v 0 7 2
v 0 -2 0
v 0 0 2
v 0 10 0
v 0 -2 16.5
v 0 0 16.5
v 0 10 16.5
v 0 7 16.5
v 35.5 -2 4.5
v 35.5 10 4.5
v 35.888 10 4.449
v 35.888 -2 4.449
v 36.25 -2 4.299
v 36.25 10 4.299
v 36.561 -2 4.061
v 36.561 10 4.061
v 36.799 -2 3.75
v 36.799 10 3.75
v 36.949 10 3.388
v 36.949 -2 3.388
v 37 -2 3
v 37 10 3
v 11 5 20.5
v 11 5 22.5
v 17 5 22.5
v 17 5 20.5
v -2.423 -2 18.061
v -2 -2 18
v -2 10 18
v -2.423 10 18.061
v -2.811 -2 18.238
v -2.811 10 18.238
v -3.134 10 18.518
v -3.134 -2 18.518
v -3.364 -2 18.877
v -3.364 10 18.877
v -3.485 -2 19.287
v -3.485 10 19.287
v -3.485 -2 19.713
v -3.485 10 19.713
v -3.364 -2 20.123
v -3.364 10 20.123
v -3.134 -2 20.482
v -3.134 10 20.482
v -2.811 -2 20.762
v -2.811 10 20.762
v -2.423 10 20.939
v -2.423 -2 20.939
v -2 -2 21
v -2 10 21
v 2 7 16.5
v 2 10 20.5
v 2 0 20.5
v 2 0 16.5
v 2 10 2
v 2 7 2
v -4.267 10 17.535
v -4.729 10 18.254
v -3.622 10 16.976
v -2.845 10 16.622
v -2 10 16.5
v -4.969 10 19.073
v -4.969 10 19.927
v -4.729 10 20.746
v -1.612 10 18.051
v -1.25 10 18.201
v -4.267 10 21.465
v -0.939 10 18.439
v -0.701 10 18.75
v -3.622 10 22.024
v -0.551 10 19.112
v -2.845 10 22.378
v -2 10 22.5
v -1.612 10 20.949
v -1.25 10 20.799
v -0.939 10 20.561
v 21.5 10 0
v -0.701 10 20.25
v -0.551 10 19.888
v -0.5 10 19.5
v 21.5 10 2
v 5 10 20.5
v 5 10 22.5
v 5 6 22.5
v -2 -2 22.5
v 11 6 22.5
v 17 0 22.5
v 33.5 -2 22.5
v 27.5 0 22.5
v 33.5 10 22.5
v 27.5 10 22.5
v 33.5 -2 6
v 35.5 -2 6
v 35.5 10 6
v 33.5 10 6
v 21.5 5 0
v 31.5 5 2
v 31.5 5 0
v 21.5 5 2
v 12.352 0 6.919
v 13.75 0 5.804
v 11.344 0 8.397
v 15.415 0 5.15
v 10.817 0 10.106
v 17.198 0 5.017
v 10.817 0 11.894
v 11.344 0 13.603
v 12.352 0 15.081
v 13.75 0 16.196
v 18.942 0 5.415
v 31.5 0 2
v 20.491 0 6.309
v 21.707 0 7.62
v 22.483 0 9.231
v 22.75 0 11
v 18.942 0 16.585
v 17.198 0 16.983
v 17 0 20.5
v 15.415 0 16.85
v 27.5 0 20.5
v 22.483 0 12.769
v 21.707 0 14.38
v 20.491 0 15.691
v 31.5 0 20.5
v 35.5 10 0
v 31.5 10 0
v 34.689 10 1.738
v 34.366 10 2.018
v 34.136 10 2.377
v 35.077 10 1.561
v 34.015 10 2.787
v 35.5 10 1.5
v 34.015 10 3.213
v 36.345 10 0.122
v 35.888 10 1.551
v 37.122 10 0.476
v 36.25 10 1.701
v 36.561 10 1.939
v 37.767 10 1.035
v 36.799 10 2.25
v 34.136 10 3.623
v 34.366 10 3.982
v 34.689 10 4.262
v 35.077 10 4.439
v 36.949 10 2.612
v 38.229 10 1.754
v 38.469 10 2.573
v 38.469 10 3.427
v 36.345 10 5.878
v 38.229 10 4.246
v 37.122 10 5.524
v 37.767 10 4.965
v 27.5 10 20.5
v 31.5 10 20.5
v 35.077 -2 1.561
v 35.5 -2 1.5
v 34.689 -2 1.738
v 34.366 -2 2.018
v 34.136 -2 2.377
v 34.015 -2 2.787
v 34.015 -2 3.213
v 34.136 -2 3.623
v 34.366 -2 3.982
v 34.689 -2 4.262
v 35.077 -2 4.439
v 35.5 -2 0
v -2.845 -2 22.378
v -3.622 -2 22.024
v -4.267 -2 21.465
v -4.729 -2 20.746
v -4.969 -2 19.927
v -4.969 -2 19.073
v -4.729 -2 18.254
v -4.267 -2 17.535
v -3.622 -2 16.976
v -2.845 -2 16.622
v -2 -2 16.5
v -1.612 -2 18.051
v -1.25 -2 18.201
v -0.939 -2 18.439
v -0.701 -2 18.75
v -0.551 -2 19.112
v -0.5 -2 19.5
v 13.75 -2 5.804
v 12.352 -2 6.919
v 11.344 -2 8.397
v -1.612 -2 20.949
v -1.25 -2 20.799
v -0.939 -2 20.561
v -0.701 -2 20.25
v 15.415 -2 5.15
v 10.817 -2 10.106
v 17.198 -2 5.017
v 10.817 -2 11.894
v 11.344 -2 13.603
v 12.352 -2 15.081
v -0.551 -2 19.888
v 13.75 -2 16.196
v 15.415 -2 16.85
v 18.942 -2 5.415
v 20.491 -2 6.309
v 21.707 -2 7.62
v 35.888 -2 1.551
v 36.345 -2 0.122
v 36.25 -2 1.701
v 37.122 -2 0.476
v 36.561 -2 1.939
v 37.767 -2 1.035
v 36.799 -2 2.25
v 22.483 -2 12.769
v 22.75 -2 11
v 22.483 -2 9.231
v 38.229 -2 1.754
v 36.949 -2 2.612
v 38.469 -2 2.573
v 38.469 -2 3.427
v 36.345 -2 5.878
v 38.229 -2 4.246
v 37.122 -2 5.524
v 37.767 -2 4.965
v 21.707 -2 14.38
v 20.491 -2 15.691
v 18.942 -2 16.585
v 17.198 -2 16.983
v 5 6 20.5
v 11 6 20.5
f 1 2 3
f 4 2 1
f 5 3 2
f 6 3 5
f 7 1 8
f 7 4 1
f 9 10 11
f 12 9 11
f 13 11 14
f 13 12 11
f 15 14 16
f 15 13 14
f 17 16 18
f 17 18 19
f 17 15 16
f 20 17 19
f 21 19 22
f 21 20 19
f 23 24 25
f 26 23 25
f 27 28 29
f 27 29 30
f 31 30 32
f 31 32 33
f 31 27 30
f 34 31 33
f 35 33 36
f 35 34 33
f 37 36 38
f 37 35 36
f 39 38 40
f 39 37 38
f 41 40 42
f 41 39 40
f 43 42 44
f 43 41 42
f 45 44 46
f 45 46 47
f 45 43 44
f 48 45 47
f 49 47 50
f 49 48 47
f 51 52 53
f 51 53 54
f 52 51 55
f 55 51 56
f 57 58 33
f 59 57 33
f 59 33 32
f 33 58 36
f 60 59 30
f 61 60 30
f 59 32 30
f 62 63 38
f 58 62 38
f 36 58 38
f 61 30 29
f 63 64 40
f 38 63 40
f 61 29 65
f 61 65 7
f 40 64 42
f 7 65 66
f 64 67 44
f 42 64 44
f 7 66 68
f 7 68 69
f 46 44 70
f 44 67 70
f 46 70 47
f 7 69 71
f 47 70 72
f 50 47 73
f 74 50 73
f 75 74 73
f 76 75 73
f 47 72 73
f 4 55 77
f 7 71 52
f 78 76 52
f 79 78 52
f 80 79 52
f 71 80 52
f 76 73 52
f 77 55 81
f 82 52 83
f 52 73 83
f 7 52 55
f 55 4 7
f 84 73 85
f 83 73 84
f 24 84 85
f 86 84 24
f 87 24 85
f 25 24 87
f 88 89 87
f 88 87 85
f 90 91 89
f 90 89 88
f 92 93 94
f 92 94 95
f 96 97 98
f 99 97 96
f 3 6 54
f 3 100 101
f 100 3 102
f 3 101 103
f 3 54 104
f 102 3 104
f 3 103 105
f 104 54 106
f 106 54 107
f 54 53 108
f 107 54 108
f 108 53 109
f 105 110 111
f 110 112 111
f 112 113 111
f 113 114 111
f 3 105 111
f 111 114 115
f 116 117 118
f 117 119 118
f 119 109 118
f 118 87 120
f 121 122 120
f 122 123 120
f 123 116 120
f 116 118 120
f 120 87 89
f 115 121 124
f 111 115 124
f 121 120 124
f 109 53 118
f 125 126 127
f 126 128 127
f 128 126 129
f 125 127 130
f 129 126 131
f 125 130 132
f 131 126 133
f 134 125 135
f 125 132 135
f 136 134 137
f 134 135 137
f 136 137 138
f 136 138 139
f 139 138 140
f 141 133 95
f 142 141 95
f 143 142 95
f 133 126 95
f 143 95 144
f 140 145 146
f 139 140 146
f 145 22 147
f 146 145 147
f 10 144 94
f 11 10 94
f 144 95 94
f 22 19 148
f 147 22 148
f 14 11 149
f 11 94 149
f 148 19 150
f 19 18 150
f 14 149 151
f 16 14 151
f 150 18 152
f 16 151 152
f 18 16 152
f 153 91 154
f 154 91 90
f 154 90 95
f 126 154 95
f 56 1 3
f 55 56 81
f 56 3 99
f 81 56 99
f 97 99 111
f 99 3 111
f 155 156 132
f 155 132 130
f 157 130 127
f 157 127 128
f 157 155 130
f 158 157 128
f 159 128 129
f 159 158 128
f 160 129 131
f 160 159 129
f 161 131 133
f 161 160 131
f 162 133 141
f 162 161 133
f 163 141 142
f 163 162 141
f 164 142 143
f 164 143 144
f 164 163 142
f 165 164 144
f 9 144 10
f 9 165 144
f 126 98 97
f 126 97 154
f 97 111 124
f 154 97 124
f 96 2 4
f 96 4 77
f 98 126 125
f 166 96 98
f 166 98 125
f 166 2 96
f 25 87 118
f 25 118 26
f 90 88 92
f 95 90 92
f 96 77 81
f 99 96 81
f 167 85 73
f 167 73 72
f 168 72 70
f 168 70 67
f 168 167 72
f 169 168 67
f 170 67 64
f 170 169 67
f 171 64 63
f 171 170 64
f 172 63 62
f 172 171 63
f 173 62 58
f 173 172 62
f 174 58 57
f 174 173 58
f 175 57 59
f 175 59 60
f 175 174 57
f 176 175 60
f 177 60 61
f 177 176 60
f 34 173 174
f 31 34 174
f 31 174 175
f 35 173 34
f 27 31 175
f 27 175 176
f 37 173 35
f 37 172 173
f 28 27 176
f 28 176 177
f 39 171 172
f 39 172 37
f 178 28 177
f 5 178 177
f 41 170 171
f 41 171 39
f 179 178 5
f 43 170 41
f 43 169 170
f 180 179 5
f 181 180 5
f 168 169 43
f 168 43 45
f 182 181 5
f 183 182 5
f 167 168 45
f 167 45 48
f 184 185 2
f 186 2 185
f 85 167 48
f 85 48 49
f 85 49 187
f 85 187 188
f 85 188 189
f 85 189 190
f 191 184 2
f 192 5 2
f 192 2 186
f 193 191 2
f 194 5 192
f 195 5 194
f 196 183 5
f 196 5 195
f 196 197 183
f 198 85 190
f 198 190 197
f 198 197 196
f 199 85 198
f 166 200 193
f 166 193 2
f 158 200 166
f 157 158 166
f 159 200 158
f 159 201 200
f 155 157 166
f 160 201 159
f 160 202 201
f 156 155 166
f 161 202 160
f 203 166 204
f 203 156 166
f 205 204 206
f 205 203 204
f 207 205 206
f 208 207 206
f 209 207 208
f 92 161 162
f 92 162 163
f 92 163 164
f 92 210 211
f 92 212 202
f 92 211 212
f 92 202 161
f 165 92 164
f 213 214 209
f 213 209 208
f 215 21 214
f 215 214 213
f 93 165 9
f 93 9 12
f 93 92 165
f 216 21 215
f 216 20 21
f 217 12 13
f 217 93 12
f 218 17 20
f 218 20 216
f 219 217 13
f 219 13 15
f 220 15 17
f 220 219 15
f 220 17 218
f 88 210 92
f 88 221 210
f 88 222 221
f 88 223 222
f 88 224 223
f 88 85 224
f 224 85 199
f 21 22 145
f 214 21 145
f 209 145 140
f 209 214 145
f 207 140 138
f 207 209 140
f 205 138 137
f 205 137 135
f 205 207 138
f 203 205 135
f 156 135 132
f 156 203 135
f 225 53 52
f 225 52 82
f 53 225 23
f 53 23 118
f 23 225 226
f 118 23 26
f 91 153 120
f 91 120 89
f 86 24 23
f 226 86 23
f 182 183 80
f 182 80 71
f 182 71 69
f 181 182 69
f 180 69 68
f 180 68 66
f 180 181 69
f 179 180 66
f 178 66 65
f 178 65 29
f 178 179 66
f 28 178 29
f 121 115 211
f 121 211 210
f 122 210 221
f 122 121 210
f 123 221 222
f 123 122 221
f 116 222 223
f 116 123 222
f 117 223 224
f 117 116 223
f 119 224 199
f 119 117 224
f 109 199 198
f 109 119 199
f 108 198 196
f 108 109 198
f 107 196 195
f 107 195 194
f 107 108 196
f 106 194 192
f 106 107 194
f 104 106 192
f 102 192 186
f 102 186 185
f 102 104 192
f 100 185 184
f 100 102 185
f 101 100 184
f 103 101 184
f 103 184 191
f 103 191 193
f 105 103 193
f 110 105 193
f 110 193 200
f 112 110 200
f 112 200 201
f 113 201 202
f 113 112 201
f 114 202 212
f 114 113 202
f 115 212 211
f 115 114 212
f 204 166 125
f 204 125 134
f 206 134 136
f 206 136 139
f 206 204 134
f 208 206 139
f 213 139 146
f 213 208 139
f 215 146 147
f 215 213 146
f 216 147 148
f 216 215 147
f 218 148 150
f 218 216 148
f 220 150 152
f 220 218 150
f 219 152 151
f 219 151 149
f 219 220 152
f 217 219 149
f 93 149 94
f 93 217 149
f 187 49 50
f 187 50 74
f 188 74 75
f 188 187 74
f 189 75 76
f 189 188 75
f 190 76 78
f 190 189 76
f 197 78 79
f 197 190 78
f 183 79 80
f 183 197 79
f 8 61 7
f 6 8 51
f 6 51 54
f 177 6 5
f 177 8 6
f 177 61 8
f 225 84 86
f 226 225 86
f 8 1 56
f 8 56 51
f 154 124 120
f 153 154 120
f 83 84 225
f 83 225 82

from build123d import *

# Parameters (mm, degrees)
F0_W      = 33.5
F0_H      = 22.5
F0_R      = 6
F1_DEPTH  = 2
F3_DEPTH  = 10
F4_W      = 6
F4_H      = 4
F5_DEPTH  = 2
F7_DEPTH  = 12
F8_W      = 6
F8_H      = 5
F9_DEPTH  = 2
F10_W     = 10
F10_H     = 2
F11_DEPTH = 5
F12_W     = 7
F12_H     = 14.5
F13_DEPTH = 2


with BuildPart() as f1:
    # F0 (on Front) → F1 (new body)
    with BuildSketch(Plane.XZ):
        with Locations((16.75, 11.25)):
            Rectangle(F0_W, F0_H)
        with Locations((16.75, 11)):
            Circle(F0_R, mode=Mode.SUBTRACT)
    extrude(amount=F1_DEPTH)

    # F2 (on face) → F3 (join)
    with BuildSketch(Plane(origin=(0, 0, 0), x_dir=(-1, 0, 0), z_dir=(0, 1, 0))):
        Polygon((-27.5, 22.5), (-33.5, 22.5), (-33.5, 0), (0, 0), (0, 22.5), (-11, 22.5), (-11, 20.5), (-2, 20.5), (-2, 2), (-31.5, 2), (-31.5, 20.5), (-27.5, 20.5), align=None)
    extrude(amount=F3_DEPTH)

    # F4 (on face) → F5 (cut, through all)
    with BuildSketch(Plane.XY.offset(22.5)):
        with Locations((8, 8)):
            Rectangle(F4_W, F4_H)
    extrude(amount=-F5_DEPTH, mode=Mode.SUBTRACT)

    # F6 (on face) → F7 (join, through all)
    with BuildSketch(Plane.XZ.offset(2)):
        with BuildLine():
            Line((33.5, 6), (33.5, 0))
            Line((33.5, 0), (35.5, 0))
            Line((35.5, 0), (35.5, 1.5))
            ThreePointArc((35.5, 1.5), (34, 3), (35.5, 4.5))
            Line((35.5, 4.5), (35.5, 6))
            Line((35.5, 6), (33.5, 6))
        make_face()
        with BuildLine():
            Line((35.5, 1.5), (35.5, 0))
            ThreePointArc((35.5, 0), (38.5, 3), (35.5, 6))
            Line((35.5, 6), (35.5, 4.5))
            ThreePointArc((35.5, 4.5), (36.56066, 4.06066), (37, 3))
            ThreePointArc((37, 3), (36.56066, 1.93934), (35.5, 1.5))
        make_face()
        with BuildLine():
            Line((0, 16.5), (0, 22.5))
            Line((0, 22.5), (-2, 22.5))
            Line((-2, 22.5), (-2, 21))
            ThreePointArc((-2, 21), (-0.93934, 20.56066), (-0.5, 19.5))
            ThreePointArc((-0.5, 19.5), (-0.93934, 18.43934), (-2, 18))
            Line((-2, 18), (-2, 16.5))
            Line((-2, 16.5), (0, 16.5))
        make_face()
        with BuildLine():
            Line((-2, 21), (-2, 22.5))
            ThreePointArc((-2, 22.5), (-5, 19.5), (-2, 16.5))
            Line((-2, 16.5), (-2, 18))
            ThreePointArc((-2, 18), (-3.5, 19.5), (-2, 21))
        make_face()
    extrude(amount=-F7_DEPTH)

    # F8 (on face) → F9 (join, through all)
    with BuildSketch(Plane.XY.offset(22.5)):
        with Locations((14, 2.5)):
            Rectangle(F8_W, F8_H)
    extrude(amount=-F9_DEPTH)

    # F10 (on face) → F11 (cut)
    with BuildSketch(Plane(origin=(0, 10, 0), x_dir=(-1, 0, 0), z_dir=(0, 1, 0))):
        with Locations((-26.5, 1)):
            Rectangle(F10_W, F10_H)
    extrude(amount=-F11_DEPTH, mode=Mode.SUBTRACT)

    # F12 (on face) → F13 (cut, through all)
    with BuildSketch(Plane(origin=(0, 0, 0), x_dir=(0, -1, 0), z_dir=(-1, 0, 0))):
        with Locations((-3.5, 9.25)):
            Rectangle(F12_W, F12_H)
    extrude(amount=-F13_DEPTH, mode=Mode.SUBTRACT)


solid = f1.part
